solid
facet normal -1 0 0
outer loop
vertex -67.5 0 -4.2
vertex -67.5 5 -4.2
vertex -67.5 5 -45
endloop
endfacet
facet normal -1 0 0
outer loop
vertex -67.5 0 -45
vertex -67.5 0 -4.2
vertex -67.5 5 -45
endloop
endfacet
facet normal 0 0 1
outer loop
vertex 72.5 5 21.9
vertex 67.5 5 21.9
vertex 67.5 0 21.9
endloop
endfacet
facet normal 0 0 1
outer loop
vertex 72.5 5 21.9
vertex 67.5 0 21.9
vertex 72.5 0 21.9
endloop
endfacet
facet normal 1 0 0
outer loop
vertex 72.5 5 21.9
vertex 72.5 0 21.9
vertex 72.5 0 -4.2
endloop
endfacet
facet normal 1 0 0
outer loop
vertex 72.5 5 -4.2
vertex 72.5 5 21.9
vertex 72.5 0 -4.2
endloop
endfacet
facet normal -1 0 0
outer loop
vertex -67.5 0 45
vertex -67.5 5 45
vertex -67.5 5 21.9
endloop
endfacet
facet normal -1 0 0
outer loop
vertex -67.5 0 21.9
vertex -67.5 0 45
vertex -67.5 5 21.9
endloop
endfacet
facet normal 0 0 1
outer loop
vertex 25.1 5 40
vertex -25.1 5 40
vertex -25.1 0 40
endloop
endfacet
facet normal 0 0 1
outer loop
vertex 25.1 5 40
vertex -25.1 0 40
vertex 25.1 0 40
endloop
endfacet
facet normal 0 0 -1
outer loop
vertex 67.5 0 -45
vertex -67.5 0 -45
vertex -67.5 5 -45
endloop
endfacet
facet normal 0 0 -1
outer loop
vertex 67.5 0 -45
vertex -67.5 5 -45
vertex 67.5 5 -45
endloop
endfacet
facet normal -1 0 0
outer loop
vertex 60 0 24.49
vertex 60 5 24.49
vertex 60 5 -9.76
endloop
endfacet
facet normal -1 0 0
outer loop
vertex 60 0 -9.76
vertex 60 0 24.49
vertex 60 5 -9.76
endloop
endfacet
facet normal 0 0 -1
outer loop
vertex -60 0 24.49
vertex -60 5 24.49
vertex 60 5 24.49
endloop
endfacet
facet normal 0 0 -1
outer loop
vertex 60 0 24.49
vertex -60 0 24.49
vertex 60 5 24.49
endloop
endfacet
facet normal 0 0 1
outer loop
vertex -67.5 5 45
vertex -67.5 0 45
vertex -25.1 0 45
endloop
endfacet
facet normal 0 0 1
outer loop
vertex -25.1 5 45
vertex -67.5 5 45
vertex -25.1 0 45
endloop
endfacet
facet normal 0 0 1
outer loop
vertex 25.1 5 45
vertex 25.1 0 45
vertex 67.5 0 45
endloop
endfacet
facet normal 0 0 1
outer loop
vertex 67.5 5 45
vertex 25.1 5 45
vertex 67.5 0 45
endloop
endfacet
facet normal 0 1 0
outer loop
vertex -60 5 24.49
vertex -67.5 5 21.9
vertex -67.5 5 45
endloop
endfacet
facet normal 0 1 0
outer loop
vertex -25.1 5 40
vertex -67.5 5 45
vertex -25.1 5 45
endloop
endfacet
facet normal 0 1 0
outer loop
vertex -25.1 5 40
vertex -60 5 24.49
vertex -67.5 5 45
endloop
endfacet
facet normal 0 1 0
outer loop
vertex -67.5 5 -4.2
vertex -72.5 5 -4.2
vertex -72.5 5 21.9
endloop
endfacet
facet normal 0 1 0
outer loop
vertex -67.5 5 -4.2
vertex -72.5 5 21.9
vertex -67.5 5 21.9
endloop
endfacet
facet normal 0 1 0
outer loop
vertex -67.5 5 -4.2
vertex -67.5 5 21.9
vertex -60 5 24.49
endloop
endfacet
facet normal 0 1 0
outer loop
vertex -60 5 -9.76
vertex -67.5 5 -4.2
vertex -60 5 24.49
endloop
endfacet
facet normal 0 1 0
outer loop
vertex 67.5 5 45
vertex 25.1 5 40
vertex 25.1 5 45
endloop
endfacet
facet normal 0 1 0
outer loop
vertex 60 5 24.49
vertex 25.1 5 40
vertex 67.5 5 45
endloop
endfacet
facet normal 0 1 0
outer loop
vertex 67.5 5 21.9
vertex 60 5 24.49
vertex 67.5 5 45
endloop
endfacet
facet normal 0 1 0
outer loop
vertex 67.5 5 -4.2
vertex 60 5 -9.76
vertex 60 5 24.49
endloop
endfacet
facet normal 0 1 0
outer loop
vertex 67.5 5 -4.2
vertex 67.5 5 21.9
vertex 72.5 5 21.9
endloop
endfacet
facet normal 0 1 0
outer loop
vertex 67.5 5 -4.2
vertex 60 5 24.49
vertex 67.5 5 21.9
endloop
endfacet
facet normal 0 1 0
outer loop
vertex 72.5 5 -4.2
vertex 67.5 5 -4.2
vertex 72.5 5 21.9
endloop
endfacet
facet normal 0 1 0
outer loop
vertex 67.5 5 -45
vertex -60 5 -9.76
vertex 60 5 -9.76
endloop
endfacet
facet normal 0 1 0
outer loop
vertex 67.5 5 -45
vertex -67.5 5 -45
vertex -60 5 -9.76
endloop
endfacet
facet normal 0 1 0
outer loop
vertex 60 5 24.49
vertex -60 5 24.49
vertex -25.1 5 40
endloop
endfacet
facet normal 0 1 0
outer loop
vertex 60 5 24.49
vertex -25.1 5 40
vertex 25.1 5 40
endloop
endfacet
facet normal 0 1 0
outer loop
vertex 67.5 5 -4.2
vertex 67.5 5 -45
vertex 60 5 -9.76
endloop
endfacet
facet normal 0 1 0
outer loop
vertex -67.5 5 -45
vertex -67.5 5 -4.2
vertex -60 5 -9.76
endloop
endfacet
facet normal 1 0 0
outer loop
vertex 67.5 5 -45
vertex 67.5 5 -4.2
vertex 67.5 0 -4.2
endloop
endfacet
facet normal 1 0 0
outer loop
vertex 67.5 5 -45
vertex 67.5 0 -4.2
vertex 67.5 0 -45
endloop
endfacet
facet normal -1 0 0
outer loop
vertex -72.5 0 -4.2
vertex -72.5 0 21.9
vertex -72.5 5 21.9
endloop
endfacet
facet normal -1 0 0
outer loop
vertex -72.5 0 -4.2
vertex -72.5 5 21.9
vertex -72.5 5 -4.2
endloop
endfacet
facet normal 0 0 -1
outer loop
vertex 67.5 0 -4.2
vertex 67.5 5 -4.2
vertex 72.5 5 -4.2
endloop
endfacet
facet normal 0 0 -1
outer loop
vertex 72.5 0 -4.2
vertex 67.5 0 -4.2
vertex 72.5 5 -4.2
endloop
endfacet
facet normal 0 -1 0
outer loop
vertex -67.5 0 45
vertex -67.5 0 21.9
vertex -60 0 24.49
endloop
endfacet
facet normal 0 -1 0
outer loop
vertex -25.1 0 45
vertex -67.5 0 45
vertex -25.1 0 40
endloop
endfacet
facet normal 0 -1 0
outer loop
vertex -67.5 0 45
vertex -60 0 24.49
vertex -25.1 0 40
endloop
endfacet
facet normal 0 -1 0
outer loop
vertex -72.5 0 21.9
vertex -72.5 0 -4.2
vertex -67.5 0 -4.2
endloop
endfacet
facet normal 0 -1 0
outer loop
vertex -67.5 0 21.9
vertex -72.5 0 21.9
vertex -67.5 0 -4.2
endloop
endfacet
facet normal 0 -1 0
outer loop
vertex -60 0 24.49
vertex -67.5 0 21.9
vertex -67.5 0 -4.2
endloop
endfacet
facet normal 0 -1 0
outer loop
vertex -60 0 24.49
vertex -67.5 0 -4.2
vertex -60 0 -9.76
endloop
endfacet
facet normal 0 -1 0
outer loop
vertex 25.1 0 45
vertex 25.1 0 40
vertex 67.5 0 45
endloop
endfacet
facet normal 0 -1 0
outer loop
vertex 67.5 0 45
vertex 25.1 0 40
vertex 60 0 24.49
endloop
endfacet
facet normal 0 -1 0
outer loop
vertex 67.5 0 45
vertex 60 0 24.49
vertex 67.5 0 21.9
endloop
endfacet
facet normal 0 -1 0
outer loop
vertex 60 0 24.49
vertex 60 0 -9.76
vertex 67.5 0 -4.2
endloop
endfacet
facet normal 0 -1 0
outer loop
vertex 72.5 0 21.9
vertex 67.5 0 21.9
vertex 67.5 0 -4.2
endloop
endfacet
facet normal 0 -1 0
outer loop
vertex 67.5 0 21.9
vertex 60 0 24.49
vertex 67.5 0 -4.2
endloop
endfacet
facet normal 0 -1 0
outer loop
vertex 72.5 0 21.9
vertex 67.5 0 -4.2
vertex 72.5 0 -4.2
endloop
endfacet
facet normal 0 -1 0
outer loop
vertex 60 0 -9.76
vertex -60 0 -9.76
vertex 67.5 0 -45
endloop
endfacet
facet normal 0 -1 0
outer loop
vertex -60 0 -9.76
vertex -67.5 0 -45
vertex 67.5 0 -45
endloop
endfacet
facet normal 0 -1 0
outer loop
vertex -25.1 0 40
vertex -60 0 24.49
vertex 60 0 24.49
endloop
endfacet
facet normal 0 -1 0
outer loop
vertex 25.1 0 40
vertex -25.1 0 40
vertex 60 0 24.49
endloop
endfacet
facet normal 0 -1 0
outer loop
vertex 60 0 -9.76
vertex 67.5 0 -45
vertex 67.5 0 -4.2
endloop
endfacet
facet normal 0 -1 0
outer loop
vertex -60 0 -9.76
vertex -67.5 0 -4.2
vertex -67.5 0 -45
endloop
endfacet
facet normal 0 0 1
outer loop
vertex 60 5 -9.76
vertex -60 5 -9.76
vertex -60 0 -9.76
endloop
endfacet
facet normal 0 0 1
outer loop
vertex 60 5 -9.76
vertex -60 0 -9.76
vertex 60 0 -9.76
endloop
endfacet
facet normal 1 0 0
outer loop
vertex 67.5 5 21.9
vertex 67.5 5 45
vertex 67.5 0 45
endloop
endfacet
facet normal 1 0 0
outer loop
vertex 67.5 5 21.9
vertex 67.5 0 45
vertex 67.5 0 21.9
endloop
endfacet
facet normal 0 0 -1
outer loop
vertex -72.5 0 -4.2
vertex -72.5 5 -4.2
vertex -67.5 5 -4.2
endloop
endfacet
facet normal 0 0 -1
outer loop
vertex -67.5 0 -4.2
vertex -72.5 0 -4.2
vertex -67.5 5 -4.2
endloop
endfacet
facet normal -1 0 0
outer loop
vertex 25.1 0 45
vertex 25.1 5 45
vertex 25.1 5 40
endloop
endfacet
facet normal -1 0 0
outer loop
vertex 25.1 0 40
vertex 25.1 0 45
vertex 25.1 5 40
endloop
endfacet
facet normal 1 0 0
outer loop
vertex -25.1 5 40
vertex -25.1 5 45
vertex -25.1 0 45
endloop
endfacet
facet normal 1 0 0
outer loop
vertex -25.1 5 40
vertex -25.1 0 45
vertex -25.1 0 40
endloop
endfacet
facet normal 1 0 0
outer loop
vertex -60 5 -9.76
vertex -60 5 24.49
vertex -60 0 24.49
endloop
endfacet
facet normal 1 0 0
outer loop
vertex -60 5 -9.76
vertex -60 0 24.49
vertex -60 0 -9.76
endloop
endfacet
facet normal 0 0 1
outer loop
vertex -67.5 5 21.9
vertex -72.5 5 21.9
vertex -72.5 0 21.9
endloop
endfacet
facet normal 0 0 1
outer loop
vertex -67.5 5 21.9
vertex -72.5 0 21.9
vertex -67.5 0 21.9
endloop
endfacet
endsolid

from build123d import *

# Parameters (mm, degrees)
SKETCH1_W           = 145
SKETCH1_H           = 90
BOSS_EXTRUDE1_DEPTH = 5
SKETCH3_W           = 120
SKETCH3_H           = 34.25
CUT_EXTRUDE1_DEPTH  = 5
SKETCH4_W           = 5
SKETCH4_H           = 40.8
SKETCH4_H_2         = 23.1
CUT_EXTRUDE2_DEPTH  = 5
SKETCH7_W           = 50.2
SKETCH7_H           = 5
CUT_EXTRUDE3_DEPTH  = 5


with BuildPart() as part:
    # Sketch1 → Boss-Extrude1 (new body)
    with BuildSketch(Plane(origin=(0, 0, 0), x_dir=(1, 0, 0), z_dir=(0, 1, 0))):
        Rectangle(SKETCH1_W, SKETCH1_H)
    extrude(amount=BOSS_EXTRUDE1_DEPTH)

    # Sketch3 → Cut-Extrude1 (cut)
    with BuildSketch(Plane(origin=(0, 5, 0), x_dir=(1, 0, 0), z_dir=(0, 1, 0))):
        with Locations((0, -7.365)):
            Rectangle(SKETCH3_W, SKETCH3_H)
    extrude(amount=-CUT_EXTRUDE1_DEPTH, mode=Mode.SUBTRACT)

    # Sketch4 → Cut-Extrude2 (cut)
    with BuildSketch(Plane(origin=(0, 5, 0), x_dir=(1, 0, 0), z_dir=(0, 1, 0))):
        with Locations((-70, 24.6)):
            Rectangle(SKETCH4_W, SKETCH4_H)
        with Locations((-70, -33.45)):
            Rectangle(SKETCH4_W, SKETCH4_H_2)
        with Locations((70, -33.45)):
            Rectangle(SKETCH4_W, SKETCH4_H_2)
        with Locations((70, 24.6)):
            Rectangle(SKETCH4_W, SKETCH4_H)
    extrude(amount=-CUT_EXTRUDE2_DEPTH, mode=Mode.SUBTRACT)

    # Sketch7 → Cut-Extrude3 (cut)
    with BuildSketch(Plane(origin=(0, 5, 0), x_dir=(1, 0, 0), z_dir=(0, 1, 0))):
        with Locations((0, -42.5)):
            Rectangle(SKETCH7_W, SKETCH7_H)
    extrude(amount=-CUT_EXTRUDE3_DEPTH, mode=Mode.SUBTRACT)


solid = part.part
